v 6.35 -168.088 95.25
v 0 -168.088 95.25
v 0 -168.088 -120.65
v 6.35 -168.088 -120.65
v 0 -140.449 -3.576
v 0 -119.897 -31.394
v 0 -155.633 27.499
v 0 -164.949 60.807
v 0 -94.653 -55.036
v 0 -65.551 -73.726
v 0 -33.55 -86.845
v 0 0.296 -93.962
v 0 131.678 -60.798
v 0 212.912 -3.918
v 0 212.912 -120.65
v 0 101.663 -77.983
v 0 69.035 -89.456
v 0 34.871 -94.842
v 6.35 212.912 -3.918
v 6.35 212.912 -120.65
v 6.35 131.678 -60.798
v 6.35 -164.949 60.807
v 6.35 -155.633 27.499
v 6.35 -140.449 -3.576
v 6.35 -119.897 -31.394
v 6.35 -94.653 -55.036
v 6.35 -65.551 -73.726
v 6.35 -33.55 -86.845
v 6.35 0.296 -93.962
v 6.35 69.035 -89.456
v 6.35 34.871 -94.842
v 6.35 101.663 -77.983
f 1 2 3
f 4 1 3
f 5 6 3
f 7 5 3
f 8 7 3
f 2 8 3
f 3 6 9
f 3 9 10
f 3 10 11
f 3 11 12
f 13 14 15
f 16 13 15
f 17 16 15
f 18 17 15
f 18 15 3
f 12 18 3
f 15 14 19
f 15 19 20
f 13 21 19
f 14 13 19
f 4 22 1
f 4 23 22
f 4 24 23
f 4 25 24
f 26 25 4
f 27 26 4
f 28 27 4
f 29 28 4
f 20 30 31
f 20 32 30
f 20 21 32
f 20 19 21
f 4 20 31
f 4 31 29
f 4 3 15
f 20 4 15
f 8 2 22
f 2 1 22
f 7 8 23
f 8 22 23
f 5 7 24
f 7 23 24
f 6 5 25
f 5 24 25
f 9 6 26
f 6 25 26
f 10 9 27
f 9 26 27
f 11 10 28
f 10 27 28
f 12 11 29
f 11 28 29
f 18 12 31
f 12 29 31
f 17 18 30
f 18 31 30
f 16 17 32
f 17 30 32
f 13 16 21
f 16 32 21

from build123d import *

# Parameters (mm, degrees)
SKETCH1_W           = 215.9
SKETCH1_H           = 381
BOSS_EXTRUDE1_DEPTH = 6.35
SKETCH2_R           = 190.5
CUT_EXTRUDE1_DEPTH  = 245.802296865
CUT_EXTRUDE2_DEPTH  = 245.802296865


with BuildPart() as part:
    # Sketch1 → Boss-Extrude1 (new body)
    with BuildSketch(Plane(origin=(0, 0, 0), x_dir=(0, 0, -1), z_dir=(1, 0, 0))):
        with Locations((12.7, 22.411764706)):
            Rectangle(SKETCH1_W, SKETCH1_H)
    extrude(amount=BOSS_EXTRUDE1_DEPTH)

    # Sketch2 → Cut-Extrude1 (cut, through all)
    with BuildSketch(Plane(origin=(6.35, 0, 0), x_dir=(0, 0, -1), z_dir=(1, 0, 0))):
        with Locations((-95.25, 22.411764706)):
            Circle(SKETCH2_R)
    extrude(amount=-CUT_EXTRUDE1_DEPTH, mode=Mode.SUBTRACT)

    # Sketch3 → Cut-Extrude2 (cut, through all)
    with BuildSketch(Plane(origin=(6.35, 0, 0), x_dir=(0, 0, -1), z_dir=(1, 0, 0))):
        Polygon((60.798464437, 131.678075831), (-18.968243734, 245.59674111), (-203.446235094, 245.59674111), (-203.446235094, 131.678075831), align=None)
    extrude(amount=-CUT_EXTRUDE2_DEPTH, mode=Mode.SUBTRACT)


solid = part.part
